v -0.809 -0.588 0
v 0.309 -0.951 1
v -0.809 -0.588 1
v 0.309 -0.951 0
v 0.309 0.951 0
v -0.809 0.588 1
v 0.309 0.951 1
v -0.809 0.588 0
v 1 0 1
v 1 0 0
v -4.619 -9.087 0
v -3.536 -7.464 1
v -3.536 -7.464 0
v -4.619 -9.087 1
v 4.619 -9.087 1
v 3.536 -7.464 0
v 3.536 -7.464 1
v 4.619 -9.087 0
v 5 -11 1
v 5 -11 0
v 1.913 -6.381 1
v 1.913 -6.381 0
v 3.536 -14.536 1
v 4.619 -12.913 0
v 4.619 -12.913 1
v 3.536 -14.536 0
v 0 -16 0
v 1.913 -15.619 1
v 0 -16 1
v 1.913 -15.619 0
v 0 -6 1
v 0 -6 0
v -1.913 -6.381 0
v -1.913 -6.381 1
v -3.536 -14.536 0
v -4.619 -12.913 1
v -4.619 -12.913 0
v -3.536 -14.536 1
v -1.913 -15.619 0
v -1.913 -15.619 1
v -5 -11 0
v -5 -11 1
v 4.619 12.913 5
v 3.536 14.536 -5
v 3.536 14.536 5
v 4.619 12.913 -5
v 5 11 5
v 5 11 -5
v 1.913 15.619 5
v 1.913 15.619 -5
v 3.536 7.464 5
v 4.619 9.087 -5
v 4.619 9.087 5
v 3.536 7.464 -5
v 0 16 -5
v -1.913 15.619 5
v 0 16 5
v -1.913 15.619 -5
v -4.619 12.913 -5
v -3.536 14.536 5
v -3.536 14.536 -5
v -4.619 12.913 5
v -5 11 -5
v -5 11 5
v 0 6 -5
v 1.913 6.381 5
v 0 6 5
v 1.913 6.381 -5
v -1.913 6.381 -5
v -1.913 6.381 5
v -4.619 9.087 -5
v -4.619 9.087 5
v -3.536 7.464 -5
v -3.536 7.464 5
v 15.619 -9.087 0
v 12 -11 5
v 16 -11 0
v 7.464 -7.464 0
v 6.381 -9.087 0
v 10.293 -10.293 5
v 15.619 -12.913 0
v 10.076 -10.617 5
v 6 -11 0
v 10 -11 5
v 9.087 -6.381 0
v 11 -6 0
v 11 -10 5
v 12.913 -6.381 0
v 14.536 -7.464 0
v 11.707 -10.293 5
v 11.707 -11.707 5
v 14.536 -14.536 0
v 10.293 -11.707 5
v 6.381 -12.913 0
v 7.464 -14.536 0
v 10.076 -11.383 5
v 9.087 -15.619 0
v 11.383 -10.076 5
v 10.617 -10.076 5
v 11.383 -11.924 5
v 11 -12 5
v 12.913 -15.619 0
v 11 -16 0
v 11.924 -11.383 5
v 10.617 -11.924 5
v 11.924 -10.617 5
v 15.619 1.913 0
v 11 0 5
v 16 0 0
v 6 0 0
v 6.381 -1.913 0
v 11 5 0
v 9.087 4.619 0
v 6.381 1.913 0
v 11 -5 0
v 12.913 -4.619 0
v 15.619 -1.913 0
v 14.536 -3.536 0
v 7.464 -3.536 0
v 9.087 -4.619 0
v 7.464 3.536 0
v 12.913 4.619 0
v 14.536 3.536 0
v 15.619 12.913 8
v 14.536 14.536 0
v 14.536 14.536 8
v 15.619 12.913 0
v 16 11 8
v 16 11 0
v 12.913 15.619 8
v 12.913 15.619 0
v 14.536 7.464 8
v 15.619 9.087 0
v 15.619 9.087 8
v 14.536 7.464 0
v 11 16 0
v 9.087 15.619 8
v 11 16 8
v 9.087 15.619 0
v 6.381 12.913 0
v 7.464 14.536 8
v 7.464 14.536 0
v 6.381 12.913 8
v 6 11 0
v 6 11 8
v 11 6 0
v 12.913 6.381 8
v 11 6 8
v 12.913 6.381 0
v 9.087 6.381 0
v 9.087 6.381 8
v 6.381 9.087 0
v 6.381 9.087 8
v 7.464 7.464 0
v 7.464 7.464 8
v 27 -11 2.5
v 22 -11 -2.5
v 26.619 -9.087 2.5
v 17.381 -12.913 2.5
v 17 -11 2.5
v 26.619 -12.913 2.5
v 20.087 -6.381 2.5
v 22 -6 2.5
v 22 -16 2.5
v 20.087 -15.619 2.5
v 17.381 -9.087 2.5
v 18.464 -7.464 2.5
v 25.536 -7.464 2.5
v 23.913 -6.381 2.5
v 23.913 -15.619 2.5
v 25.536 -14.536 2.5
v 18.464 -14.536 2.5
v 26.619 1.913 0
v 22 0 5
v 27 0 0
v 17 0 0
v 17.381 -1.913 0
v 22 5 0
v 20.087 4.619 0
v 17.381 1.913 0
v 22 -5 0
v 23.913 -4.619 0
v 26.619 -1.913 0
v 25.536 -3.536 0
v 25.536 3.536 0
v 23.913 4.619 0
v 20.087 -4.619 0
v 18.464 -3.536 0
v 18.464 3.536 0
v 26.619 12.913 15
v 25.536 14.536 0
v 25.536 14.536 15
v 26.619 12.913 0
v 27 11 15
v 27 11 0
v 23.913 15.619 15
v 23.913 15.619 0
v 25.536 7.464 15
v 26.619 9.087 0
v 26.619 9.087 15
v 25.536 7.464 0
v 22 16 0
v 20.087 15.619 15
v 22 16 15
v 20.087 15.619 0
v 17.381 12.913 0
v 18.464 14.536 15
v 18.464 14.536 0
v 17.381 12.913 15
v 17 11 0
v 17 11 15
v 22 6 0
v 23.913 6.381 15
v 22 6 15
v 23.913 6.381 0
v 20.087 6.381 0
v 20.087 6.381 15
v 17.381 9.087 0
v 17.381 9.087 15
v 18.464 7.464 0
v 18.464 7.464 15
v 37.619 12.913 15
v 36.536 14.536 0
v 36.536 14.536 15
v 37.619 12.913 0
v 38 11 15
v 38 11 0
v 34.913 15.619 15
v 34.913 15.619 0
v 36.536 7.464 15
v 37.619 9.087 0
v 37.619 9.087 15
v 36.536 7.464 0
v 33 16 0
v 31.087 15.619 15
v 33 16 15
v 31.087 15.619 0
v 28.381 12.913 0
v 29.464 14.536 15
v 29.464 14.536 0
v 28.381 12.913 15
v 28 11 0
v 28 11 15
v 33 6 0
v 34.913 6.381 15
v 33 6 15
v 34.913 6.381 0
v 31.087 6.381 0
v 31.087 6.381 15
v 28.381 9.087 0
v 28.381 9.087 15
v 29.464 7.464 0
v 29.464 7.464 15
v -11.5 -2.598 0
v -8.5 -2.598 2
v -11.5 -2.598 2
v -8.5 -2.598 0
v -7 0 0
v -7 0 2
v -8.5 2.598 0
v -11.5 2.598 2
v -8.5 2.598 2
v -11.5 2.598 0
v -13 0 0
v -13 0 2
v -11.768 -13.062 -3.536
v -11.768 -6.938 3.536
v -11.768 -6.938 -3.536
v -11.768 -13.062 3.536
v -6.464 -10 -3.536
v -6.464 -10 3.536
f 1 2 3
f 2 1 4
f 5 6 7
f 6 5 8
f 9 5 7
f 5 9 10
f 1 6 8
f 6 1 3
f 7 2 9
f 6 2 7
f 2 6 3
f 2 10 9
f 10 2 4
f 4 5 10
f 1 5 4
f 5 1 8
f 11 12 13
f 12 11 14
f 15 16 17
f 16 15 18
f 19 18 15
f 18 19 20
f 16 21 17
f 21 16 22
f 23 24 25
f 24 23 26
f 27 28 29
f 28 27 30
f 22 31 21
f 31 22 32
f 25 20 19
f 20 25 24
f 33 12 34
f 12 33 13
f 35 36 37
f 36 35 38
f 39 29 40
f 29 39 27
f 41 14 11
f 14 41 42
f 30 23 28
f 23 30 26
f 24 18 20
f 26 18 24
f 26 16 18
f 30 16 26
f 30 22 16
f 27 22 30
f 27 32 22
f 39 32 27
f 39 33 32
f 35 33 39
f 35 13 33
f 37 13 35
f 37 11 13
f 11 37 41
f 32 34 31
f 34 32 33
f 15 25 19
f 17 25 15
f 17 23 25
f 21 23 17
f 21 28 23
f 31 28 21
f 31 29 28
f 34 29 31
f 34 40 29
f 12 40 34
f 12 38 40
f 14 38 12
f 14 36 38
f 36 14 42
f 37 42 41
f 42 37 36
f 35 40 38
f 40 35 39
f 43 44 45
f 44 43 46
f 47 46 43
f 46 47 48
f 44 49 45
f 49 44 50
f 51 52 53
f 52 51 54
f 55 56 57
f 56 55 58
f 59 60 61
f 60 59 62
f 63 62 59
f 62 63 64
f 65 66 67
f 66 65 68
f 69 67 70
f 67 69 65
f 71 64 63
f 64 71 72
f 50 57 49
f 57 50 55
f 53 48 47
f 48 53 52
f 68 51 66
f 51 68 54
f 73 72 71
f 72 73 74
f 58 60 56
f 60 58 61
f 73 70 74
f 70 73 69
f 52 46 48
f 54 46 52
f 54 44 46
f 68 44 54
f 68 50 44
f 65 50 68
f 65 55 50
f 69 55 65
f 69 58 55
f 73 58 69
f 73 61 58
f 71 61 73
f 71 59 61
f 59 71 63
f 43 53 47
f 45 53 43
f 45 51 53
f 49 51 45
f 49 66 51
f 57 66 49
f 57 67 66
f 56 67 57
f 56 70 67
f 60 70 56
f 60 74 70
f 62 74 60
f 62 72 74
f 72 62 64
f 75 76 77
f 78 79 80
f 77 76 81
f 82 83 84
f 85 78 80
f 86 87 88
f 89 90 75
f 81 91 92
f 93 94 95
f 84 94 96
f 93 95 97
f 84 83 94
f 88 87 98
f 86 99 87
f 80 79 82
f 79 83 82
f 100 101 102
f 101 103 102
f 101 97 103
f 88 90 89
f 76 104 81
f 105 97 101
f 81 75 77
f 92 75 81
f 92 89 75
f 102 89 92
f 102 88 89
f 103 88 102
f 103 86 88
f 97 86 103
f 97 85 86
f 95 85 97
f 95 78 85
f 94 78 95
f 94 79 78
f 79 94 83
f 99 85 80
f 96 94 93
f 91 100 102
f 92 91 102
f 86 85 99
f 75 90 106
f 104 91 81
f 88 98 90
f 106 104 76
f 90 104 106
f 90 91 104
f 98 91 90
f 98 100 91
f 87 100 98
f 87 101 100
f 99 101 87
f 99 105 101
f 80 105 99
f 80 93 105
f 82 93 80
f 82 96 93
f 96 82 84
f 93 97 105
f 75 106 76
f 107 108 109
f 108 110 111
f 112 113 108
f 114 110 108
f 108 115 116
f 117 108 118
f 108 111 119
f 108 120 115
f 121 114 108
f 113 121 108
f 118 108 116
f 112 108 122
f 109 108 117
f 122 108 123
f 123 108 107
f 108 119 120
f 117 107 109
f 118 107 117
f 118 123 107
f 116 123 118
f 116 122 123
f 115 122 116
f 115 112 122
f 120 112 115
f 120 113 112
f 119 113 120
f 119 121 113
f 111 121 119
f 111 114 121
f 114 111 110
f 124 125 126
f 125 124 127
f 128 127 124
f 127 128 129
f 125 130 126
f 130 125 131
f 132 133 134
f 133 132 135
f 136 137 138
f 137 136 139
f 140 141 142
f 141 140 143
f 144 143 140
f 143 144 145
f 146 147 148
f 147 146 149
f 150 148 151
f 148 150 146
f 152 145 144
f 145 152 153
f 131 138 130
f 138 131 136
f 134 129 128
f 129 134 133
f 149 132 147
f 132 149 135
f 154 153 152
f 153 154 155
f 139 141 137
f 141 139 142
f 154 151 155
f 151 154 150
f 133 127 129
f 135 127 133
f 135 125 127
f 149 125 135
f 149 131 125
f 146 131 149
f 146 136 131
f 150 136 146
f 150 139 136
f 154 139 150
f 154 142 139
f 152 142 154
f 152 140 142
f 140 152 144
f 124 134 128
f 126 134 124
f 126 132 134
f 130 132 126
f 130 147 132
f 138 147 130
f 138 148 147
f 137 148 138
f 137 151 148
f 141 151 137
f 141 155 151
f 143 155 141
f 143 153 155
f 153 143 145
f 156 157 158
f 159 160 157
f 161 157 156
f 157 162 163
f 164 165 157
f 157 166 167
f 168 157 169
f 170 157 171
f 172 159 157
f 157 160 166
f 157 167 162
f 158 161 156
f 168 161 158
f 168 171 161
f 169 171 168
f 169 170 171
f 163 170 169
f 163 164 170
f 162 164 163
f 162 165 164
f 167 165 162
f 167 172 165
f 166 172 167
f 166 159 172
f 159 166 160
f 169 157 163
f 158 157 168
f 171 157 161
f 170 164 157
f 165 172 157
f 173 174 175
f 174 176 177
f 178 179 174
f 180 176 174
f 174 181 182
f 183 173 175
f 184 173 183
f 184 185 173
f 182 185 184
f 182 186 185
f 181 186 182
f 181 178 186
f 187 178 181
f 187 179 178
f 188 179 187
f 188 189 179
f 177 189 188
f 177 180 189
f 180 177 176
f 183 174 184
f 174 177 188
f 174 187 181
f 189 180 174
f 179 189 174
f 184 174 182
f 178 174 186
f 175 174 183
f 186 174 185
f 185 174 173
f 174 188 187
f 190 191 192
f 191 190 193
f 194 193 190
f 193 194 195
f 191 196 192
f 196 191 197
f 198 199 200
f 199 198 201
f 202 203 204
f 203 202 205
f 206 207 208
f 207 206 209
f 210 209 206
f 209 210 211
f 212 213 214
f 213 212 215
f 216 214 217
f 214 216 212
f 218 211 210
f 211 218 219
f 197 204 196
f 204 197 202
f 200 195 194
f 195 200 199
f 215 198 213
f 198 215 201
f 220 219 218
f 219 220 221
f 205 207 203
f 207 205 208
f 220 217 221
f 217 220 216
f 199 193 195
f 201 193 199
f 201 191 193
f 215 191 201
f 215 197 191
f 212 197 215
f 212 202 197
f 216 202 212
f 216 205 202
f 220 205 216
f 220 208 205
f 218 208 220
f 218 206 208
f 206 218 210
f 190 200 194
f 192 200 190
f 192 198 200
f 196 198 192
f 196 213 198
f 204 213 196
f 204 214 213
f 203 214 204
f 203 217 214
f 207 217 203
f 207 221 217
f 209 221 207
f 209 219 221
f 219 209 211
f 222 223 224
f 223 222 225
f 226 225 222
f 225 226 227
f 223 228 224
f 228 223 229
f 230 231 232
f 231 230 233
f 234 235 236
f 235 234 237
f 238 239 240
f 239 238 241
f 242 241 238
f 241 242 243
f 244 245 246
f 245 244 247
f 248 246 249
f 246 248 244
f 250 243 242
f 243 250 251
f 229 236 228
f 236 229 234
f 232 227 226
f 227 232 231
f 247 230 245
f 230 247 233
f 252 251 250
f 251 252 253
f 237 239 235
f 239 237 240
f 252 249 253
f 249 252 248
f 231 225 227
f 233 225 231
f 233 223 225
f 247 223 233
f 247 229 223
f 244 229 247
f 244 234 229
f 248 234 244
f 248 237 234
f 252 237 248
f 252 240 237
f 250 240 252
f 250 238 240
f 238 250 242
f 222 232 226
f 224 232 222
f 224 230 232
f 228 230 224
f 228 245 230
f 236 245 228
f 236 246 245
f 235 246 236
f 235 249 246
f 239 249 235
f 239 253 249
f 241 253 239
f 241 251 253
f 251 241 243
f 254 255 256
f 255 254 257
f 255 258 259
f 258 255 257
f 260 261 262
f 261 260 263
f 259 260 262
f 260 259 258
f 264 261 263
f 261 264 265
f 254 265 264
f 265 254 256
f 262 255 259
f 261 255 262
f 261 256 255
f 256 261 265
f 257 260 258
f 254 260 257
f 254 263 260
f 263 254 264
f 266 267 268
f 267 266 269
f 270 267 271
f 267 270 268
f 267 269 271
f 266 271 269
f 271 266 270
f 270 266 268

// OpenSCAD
cylinder();
translate([1,0,0]) cylinder(r=0);
translate([2,0,0]) cylinder(r1=0, r2=0);
translate([0,-11,0]) cylinder(r=5);
translate([0,11,0]) cylinder(r=5, h=10, center=true);

translate([11,-11,0]) cylinder(h=5, r1=5);
translate([11,0,0]) cylinder(h=5, r1=5, r2=0);
translate([11,11,0]) cylinder(h=8, r1=5, r2=5);

translate([22,-11,0]) cylinder(h=5, r=5, r1=0, center=true);
translate([22,0,0]) cylinder(h=5, r=5, r2=0);
translate([22,11,0]) cylinder(h=15, r=5, r2=5);

translate([33,11,0]) cylinder(h=15, r=5,angle=135);


// This tests for hexagonal cylinder orientation, since people
// tend to "abuse" this for captured nut slots
translate([-10,0,0]) cylinder(h=2, r=3, $fn=6);

// Test that we clamp number of sections to a minimum of 3
translate([-10, -10, 0]) cylinder(r=3.5356, h=7.0711, $fn=0.1, center=true);
